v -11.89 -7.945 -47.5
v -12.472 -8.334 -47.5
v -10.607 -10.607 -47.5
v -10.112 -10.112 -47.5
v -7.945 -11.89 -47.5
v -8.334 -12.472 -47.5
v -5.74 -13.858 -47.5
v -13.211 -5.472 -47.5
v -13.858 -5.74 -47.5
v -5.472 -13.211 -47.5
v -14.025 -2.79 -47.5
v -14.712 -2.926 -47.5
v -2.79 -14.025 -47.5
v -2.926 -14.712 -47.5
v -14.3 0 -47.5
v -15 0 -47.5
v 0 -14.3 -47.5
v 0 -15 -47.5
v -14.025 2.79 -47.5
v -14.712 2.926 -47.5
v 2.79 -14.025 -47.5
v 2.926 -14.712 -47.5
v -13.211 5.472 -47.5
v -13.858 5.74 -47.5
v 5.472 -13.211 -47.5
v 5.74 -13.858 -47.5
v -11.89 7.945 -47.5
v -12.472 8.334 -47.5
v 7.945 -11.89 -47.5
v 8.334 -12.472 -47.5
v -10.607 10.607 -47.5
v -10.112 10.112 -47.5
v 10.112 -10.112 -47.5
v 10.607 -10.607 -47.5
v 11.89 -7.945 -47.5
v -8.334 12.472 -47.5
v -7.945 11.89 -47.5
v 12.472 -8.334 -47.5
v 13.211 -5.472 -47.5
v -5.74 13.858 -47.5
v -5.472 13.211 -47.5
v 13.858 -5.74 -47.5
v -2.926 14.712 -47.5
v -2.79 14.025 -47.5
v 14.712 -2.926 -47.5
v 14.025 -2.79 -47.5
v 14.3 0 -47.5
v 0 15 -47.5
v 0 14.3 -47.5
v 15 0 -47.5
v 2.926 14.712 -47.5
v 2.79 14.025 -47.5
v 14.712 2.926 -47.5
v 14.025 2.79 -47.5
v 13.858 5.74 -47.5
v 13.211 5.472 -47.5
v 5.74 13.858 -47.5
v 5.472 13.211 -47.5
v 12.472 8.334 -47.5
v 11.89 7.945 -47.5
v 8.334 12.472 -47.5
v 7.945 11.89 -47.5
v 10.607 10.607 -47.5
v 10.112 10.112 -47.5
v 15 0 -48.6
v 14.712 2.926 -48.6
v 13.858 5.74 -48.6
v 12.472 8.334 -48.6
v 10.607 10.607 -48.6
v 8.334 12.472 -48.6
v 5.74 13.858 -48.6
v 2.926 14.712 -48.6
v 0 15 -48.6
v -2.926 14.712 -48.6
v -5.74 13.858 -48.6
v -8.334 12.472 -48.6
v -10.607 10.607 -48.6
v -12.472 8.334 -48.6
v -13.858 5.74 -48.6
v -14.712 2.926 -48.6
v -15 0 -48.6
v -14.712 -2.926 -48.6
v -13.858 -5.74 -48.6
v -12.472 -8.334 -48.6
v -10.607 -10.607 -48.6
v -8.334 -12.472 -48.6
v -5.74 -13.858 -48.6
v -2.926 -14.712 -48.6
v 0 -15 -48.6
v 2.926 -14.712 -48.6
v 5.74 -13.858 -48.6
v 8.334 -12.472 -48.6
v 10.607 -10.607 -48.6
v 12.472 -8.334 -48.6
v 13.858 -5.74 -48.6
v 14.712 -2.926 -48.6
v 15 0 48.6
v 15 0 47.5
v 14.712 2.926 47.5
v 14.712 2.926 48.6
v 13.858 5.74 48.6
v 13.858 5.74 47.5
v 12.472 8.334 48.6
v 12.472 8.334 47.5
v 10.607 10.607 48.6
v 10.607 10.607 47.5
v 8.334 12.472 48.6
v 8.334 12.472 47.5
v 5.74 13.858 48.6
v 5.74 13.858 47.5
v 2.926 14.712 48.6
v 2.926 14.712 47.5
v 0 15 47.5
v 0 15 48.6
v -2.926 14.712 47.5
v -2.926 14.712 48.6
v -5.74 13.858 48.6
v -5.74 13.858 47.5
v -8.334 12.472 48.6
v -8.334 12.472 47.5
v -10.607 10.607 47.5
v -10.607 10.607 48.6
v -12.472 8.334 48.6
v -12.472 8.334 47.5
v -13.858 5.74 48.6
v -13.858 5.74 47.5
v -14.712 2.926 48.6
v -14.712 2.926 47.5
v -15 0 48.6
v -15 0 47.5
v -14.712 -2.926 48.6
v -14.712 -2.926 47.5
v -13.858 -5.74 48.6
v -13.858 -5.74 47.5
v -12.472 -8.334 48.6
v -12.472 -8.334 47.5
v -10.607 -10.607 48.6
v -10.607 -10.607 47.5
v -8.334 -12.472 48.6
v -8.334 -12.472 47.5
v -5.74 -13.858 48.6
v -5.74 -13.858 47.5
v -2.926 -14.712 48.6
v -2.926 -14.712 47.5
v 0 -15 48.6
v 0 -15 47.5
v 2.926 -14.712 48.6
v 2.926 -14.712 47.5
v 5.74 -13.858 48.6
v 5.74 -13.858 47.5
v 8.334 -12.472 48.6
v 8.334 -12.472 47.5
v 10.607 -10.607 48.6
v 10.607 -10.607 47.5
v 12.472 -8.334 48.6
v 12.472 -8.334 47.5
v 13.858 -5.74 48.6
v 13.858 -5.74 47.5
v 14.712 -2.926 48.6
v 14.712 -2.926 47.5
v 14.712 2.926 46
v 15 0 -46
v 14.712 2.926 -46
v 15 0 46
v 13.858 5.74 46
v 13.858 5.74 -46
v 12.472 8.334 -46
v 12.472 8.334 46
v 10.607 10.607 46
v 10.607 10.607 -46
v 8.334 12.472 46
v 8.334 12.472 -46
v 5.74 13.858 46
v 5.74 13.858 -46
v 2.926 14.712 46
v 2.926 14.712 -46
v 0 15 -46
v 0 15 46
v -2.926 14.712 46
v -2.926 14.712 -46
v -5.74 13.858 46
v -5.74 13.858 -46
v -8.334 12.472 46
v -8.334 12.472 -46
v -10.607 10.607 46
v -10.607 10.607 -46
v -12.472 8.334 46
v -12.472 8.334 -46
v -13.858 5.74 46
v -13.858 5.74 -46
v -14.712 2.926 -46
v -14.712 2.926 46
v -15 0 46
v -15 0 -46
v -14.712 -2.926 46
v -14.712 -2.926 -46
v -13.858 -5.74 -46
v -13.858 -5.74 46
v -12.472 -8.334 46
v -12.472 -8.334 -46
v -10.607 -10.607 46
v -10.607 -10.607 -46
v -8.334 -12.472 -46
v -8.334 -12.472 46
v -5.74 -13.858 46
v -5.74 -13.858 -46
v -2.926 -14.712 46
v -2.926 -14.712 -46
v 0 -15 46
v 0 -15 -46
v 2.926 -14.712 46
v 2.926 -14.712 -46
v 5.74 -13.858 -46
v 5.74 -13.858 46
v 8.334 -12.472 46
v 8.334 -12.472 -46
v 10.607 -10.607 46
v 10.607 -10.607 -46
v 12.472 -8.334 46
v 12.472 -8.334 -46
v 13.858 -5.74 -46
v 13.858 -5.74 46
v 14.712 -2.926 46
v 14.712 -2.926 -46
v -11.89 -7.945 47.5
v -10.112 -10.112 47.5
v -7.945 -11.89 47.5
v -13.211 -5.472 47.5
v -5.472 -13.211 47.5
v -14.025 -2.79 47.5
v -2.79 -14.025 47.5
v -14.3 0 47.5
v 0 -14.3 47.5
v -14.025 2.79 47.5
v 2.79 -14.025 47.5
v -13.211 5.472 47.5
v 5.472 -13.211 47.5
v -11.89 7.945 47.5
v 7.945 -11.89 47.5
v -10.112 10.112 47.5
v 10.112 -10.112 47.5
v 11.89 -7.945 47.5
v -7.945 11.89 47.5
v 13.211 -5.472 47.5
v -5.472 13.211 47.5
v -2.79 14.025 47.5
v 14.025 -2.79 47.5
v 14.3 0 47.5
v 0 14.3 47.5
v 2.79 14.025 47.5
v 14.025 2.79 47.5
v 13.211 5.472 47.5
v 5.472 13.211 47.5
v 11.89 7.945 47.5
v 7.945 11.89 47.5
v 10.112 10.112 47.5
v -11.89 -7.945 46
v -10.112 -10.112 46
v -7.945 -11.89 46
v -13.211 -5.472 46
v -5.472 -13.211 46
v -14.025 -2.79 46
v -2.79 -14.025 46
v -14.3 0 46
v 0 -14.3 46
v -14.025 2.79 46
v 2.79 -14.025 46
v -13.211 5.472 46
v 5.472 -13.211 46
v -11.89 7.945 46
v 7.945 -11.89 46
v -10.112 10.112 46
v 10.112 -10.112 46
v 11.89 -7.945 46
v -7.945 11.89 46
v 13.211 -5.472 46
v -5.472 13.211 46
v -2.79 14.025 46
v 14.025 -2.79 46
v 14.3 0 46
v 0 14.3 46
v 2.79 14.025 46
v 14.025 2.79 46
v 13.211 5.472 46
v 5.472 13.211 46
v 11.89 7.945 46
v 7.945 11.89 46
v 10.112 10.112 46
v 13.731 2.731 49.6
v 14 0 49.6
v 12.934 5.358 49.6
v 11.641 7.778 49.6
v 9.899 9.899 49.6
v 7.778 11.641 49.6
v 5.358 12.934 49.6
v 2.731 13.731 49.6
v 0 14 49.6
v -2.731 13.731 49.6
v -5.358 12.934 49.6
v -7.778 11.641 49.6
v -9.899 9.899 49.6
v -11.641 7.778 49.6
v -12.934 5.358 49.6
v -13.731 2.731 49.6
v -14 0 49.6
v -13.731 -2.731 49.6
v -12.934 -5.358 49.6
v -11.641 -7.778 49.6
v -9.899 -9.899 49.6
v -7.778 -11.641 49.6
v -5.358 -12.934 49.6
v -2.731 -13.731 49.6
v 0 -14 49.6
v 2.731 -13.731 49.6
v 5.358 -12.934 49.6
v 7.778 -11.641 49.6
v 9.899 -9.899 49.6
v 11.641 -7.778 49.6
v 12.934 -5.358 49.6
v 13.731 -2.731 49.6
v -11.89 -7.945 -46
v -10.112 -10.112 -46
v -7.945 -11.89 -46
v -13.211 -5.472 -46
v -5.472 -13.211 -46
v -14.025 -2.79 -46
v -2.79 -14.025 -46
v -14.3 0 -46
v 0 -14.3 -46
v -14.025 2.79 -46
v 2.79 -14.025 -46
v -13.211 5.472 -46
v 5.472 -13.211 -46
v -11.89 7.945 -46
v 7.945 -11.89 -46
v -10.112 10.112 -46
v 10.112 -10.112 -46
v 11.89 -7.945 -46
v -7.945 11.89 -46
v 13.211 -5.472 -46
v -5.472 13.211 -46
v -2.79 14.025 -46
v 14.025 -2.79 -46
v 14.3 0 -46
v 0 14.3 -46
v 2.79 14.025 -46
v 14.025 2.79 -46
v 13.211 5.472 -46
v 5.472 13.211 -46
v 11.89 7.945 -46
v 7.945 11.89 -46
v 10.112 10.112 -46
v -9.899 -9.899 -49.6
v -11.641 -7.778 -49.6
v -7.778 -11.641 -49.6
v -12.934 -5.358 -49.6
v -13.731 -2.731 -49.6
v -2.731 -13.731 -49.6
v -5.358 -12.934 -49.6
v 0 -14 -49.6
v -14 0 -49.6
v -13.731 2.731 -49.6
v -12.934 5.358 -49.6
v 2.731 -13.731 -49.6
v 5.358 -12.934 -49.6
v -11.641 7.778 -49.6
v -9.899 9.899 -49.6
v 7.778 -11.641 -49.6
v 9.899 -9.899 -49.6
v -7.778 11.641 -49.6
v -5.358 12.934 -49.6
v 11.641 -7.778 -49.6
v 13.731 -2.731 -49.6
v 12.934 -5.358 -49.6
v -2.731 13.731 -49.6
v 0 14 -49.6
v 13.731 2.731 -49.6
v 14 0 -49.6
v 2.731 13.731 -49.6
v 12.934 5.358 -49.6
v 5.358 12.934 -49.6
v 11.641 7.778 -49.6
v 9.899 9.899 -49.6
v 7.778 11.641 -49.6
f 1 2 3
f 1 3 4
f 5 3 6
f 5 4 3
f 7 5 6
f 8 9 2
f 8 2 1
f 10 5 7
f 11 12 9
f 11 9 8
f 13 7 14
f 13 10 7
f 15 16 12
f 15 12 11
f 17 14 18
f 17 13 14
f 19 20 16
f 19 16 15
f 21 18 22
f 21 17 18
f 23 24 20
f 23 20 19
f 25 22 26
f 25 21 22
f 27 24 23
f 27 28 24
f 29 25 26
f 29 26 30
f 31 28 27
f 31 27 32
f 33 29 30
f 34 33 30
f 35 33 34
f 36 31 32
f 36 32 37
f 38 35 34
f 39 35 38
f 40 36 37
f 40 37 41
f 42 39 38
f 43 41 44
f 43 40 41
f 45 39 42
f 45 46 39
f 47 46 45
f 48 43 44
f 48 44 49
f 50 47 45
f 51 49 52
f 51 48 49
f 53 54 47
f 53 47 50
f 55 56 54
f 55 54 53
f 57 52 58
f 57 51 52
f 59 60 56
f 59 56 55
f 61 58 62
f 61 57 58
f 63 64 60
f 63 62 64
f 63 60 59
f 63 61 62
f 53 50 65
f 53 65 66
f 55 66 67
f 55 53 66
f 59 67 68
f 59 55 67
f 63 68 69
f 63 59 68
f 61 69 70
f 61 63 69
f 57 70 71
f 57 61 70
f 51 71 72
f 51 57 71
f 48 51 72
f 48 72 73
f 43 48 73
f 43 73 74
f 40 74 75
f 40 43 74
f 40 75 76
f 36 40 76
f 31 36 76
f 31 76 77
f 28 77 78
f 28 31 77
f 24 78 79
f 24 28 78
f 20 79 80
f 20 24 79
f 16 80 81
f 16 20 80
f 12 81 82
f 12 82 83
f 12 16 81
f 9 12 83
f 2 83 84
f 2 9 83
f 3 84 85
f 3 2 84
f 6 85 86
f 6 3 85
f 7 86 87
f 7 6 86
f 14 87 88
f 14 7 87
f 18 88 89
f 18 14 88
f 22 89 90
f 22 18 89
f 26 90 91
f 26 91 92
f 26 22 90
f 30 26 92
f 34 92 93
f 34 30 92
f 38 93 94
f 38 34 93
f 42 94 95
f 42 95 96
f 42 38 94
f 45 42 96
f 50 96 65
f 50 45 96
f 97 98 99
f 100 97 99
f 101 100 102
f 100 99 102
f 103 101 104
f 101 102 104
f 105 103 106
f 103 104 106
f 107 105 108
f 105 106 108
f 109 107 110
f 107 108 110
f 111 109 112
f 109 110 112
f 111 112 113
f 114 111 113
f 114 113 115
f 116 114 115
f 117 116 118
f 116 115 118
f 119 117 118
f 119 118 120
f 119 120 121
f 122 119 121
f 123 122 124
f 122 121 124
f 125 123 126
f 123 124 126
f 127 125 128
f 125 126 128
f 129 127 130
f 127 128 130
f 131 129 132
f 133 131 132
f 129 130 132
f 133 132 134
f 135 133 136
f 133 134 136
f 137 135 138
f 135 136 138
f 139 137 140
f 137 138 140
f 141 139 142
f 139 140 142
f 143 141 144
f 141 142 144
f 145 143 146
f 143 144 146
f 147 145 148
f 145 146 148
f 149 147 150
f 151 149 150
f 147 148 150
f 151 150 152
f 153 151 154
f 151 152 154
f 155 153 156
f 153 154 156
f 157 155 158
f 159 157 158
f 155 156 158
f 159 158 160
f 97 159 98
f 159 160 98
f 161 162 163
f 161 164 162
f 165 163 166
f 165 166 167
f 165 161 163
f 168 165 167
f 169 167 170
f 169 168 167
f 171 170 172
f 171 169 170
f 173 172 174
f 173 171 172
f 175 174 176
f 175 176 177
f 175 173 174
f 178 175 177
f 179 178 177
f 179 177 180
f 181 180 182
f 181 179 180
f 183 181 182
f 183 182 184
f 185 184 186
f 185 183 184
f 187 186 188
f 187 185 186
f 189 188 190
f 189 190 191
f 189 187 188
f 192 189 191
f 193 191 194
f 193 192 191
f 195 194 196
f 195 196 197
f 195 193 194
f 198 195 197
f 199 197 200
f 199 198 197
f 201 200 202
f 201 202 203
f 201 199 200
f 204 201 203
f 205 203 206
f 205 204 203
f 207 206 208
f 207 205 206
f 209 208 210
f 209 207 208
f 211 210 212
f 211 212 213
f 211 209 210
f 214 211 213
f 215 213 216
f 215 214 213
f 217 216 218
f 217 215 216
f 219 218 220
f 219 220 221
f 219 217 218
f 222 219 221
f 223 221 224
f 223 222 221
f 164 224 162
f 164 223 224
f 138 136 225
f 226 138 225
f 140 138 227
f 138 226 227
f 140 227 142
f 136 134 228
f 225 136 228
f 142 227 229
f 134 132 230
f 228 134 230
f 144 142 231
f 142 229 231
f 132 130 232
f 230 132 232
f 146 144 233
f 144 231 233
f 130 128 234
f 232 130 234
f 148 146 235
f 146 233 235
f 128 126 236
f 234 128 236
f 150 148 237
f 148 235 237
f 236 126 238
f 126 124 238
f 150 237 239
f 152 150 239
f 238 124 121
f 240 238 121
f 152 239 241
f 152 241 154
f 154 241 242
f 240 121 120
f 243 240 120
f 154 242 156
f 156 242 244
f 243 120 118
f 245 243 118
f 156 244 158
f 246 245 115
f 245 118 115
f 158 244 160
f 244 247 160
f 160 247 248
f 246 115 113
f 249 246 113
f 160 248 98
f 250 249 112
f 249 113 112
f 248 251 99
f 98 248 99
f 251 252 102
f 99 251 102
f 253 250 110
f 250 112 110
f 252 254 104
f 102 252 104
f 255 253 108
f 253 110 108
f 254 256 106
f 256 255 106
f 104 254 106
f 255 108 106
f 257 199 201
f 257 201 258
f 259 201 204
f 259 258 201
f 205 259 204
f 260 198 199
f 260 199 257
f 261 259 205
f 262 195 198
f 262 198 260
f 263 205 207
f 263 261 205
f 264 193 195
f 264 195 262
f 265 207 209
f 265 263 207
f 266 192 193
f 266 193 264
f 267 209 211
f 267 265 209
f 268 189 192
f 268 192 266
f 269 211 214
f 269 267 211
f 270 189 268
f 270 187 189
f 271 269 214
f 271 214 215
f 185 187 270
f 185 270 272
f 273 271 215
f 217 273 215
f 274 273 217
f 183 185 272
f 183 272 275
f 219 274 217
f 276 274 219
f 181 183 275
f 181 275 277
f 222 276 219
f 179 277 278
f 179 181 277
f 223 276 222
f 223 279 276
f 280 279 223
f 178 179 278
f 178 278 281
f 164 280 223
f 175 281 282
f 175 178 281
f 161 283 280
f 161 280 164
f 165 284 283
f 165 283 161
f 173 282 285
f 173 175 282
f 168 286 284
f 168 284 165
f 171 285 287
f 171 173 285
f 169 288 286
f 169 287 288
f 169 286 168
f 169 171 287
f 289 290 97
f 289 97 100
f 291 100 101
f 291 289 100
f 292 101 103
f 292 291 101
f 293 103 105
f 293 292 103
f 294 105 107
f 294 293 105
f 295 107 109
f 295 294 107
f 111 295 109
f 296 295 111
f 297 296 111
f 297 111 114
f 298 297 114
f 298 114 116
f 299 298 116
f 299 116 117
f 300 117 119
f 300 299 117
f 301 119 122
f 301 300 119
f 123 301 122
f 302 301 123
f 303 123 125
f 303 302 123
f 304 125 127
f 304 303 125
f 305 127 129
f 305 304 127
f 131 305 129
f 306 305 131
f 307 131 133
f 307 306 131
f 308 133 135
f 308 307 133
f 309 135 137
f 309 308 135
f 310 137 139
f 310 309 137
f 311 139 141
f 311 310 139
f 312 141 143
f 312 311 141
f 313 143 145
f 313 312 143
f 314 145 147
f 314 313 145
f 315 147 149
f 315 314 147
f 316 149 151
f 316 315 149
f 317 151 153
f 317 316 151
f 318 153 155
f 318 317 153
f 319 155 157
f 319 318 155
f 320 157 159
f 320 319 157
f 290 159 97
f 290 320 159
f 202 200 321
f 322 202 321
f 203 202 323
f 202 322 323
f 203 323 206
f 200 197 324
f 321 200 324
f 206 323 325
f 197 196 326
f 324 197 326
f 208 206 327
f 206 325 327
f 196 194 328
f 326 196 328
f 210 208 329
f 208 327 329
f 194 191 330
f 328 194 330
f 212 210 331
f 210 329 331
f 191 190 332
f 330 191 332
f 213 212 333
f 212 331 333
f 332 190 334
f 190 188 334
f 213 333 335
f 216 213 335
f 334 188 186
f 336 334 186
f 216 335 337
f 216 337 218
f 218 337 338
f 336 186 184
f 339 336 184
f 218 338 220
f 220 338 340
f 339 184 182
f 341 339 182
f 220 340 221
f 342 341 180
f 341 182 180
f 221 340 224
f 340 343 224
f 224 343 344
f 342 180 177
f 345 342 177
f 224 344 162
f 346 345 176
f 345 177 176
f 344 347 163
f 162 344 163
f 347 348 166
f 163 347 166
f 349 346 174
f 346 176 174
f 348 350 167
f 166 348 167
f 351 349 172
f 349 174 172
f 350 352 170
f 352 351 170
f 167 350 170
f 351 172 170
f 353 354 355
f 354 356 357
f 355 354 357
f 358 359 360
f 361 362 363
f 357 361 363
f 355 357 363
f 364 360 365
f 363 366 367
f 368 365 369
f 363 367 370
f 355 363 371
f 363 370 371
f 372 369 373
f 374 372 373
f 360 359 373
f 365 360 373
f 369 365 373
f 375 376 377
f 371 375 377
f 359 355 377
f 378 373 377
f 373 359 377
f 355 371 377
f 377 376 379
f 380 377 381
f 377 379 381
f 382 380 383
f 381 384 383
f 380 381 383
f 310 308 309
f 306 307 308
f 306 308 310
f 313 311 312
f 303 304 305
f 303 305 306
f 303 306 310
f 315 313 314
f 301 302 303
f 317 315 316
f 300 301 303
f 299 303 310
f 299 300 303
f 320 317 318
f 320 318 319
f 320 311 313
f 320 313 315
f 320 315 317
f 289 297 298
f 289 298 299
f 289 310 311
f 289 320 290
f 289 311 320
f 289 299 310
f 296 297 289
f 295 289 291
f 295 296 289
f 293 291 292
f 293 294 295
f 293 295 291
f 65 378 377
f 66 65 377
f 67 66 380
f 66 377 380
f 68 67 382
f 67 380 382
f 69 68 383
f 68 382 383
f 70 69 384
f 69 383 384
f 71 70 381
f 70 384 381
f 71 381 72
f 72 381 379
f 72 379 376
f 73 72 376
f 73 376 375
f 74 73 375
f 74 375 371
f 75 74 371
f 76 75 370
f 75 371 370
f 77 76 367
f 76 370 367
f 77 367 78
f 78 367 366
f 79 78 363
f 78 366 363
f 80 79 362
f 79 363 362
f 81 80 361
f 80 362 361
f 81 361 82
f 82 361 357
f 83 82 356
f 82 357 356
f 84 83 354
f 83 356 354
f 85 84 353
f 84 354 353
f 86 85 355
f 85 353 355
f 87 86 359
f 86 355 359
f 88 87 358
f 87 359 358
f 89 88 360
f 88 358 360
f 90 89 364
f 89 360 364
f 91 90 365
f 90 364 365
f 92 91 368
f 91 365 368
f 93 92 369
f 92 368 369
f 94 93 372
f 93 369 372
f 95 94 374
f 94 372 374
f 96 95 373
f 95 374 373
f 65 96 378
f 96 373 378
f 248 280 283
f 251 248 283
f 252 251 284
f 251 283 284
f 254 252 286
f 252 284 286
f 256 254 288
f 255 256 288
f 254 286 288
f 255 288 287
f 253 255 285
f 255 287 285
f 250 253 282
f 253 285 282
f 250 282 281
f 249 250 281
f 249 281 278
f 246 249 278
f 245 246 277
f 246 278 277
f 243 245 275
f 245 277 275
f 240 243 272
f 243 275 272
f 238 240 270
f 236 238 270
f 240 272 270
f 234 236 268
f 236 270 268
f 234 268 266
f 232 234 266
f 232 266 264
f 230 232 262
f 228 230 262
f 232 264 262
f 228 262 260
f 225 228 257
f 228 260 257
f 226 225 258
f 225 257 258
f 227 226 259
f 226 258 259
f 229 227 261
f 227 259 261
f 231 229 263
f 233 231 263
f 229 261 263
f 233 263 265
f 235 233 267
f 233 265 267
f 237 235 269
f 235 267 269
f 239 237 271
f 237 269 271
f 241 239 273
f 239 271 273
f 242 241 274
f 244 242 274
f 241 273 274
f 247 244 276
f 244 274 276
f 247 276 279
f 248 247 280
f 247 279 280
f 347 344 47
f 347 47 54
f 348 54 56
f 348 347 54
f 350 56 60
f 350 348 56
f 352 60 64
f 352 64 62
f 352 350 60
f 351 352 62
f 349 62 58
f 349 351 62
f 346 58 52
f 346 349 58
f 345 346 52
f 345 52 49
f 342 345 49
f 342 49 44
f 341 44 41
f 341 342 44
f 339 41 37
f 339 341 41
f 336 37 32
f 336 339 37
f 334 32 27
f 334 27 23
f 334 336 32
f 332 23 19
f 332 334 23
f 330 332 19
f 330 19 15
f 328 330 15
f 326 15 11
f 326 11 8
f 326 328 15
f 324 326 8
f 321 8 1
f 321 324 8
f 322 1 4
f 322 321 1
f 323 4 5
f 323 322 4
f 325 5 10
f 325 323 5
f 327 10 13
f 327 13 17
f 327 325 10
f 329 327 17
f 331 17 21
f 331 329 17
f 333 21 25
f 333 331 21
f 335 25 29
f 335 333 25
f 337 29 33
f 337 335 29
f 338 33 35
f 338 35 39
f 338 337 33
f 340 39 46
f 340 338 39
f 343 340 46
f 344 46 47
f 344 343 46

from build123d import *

# Parameters (mm, degrees)
SZKIC1_R                   = 15
WYCI_GNI_CIE_PROSTE1_DEPTH = 46
SZKIC2_R                   = 14.3
WYCI_GNI_CIE_PROSTE2_DEPTH = 1.5
SZKIC3_R                   = 15
WYCI_GNI_CIE_PROSTE3_DEPTH = 2.1
FAZA1_SIZE                 = 1


with BuildPart() as part:
    # Szkic1 → Wyciągnięcie proste1 (new body)
    with BuildSketch(Plane.XY):
        Circle(SZKIC1_R)
    extrude(amount=WYCI_GNI_CIE_PROSTE1_DEPTH)

    # Szkic2 → Wyciągnięcie proste2 (add)
    with BuildSketch(Plane.XY.offset(46)):
        Circle(SZKIC2_R)
    extrude(amount=WYCI_GNI_CIE_PROSTE2_DEPTH)

    # Szkic3 → Wyciągnięcie proste3 (add)
    with BuildSketch(Plane.XY.offset(47.5)):
        Circle(SZKIC3_R)
    extrude(amount=WYCI_GNI_CIE_PROSTE3_DEPTH)

    # Faza1
    faza1_edges = [part.edges().sort_by_distance(p)[0] for p in [
        (-15, 0, 49.6),
    ]]
    chamfer(faza1_edges, length=FAZA1_SIZE)

    # Odbicie lustrzane1: part across plane


with BuildPart() as part_1:
    add(part.part)
    add(part.part.mirror(Plane(origin=(0, 0, 0), x_dir=(1, 0, 0), z_dir=(0, 0, -1))))


solid = part_1.part
